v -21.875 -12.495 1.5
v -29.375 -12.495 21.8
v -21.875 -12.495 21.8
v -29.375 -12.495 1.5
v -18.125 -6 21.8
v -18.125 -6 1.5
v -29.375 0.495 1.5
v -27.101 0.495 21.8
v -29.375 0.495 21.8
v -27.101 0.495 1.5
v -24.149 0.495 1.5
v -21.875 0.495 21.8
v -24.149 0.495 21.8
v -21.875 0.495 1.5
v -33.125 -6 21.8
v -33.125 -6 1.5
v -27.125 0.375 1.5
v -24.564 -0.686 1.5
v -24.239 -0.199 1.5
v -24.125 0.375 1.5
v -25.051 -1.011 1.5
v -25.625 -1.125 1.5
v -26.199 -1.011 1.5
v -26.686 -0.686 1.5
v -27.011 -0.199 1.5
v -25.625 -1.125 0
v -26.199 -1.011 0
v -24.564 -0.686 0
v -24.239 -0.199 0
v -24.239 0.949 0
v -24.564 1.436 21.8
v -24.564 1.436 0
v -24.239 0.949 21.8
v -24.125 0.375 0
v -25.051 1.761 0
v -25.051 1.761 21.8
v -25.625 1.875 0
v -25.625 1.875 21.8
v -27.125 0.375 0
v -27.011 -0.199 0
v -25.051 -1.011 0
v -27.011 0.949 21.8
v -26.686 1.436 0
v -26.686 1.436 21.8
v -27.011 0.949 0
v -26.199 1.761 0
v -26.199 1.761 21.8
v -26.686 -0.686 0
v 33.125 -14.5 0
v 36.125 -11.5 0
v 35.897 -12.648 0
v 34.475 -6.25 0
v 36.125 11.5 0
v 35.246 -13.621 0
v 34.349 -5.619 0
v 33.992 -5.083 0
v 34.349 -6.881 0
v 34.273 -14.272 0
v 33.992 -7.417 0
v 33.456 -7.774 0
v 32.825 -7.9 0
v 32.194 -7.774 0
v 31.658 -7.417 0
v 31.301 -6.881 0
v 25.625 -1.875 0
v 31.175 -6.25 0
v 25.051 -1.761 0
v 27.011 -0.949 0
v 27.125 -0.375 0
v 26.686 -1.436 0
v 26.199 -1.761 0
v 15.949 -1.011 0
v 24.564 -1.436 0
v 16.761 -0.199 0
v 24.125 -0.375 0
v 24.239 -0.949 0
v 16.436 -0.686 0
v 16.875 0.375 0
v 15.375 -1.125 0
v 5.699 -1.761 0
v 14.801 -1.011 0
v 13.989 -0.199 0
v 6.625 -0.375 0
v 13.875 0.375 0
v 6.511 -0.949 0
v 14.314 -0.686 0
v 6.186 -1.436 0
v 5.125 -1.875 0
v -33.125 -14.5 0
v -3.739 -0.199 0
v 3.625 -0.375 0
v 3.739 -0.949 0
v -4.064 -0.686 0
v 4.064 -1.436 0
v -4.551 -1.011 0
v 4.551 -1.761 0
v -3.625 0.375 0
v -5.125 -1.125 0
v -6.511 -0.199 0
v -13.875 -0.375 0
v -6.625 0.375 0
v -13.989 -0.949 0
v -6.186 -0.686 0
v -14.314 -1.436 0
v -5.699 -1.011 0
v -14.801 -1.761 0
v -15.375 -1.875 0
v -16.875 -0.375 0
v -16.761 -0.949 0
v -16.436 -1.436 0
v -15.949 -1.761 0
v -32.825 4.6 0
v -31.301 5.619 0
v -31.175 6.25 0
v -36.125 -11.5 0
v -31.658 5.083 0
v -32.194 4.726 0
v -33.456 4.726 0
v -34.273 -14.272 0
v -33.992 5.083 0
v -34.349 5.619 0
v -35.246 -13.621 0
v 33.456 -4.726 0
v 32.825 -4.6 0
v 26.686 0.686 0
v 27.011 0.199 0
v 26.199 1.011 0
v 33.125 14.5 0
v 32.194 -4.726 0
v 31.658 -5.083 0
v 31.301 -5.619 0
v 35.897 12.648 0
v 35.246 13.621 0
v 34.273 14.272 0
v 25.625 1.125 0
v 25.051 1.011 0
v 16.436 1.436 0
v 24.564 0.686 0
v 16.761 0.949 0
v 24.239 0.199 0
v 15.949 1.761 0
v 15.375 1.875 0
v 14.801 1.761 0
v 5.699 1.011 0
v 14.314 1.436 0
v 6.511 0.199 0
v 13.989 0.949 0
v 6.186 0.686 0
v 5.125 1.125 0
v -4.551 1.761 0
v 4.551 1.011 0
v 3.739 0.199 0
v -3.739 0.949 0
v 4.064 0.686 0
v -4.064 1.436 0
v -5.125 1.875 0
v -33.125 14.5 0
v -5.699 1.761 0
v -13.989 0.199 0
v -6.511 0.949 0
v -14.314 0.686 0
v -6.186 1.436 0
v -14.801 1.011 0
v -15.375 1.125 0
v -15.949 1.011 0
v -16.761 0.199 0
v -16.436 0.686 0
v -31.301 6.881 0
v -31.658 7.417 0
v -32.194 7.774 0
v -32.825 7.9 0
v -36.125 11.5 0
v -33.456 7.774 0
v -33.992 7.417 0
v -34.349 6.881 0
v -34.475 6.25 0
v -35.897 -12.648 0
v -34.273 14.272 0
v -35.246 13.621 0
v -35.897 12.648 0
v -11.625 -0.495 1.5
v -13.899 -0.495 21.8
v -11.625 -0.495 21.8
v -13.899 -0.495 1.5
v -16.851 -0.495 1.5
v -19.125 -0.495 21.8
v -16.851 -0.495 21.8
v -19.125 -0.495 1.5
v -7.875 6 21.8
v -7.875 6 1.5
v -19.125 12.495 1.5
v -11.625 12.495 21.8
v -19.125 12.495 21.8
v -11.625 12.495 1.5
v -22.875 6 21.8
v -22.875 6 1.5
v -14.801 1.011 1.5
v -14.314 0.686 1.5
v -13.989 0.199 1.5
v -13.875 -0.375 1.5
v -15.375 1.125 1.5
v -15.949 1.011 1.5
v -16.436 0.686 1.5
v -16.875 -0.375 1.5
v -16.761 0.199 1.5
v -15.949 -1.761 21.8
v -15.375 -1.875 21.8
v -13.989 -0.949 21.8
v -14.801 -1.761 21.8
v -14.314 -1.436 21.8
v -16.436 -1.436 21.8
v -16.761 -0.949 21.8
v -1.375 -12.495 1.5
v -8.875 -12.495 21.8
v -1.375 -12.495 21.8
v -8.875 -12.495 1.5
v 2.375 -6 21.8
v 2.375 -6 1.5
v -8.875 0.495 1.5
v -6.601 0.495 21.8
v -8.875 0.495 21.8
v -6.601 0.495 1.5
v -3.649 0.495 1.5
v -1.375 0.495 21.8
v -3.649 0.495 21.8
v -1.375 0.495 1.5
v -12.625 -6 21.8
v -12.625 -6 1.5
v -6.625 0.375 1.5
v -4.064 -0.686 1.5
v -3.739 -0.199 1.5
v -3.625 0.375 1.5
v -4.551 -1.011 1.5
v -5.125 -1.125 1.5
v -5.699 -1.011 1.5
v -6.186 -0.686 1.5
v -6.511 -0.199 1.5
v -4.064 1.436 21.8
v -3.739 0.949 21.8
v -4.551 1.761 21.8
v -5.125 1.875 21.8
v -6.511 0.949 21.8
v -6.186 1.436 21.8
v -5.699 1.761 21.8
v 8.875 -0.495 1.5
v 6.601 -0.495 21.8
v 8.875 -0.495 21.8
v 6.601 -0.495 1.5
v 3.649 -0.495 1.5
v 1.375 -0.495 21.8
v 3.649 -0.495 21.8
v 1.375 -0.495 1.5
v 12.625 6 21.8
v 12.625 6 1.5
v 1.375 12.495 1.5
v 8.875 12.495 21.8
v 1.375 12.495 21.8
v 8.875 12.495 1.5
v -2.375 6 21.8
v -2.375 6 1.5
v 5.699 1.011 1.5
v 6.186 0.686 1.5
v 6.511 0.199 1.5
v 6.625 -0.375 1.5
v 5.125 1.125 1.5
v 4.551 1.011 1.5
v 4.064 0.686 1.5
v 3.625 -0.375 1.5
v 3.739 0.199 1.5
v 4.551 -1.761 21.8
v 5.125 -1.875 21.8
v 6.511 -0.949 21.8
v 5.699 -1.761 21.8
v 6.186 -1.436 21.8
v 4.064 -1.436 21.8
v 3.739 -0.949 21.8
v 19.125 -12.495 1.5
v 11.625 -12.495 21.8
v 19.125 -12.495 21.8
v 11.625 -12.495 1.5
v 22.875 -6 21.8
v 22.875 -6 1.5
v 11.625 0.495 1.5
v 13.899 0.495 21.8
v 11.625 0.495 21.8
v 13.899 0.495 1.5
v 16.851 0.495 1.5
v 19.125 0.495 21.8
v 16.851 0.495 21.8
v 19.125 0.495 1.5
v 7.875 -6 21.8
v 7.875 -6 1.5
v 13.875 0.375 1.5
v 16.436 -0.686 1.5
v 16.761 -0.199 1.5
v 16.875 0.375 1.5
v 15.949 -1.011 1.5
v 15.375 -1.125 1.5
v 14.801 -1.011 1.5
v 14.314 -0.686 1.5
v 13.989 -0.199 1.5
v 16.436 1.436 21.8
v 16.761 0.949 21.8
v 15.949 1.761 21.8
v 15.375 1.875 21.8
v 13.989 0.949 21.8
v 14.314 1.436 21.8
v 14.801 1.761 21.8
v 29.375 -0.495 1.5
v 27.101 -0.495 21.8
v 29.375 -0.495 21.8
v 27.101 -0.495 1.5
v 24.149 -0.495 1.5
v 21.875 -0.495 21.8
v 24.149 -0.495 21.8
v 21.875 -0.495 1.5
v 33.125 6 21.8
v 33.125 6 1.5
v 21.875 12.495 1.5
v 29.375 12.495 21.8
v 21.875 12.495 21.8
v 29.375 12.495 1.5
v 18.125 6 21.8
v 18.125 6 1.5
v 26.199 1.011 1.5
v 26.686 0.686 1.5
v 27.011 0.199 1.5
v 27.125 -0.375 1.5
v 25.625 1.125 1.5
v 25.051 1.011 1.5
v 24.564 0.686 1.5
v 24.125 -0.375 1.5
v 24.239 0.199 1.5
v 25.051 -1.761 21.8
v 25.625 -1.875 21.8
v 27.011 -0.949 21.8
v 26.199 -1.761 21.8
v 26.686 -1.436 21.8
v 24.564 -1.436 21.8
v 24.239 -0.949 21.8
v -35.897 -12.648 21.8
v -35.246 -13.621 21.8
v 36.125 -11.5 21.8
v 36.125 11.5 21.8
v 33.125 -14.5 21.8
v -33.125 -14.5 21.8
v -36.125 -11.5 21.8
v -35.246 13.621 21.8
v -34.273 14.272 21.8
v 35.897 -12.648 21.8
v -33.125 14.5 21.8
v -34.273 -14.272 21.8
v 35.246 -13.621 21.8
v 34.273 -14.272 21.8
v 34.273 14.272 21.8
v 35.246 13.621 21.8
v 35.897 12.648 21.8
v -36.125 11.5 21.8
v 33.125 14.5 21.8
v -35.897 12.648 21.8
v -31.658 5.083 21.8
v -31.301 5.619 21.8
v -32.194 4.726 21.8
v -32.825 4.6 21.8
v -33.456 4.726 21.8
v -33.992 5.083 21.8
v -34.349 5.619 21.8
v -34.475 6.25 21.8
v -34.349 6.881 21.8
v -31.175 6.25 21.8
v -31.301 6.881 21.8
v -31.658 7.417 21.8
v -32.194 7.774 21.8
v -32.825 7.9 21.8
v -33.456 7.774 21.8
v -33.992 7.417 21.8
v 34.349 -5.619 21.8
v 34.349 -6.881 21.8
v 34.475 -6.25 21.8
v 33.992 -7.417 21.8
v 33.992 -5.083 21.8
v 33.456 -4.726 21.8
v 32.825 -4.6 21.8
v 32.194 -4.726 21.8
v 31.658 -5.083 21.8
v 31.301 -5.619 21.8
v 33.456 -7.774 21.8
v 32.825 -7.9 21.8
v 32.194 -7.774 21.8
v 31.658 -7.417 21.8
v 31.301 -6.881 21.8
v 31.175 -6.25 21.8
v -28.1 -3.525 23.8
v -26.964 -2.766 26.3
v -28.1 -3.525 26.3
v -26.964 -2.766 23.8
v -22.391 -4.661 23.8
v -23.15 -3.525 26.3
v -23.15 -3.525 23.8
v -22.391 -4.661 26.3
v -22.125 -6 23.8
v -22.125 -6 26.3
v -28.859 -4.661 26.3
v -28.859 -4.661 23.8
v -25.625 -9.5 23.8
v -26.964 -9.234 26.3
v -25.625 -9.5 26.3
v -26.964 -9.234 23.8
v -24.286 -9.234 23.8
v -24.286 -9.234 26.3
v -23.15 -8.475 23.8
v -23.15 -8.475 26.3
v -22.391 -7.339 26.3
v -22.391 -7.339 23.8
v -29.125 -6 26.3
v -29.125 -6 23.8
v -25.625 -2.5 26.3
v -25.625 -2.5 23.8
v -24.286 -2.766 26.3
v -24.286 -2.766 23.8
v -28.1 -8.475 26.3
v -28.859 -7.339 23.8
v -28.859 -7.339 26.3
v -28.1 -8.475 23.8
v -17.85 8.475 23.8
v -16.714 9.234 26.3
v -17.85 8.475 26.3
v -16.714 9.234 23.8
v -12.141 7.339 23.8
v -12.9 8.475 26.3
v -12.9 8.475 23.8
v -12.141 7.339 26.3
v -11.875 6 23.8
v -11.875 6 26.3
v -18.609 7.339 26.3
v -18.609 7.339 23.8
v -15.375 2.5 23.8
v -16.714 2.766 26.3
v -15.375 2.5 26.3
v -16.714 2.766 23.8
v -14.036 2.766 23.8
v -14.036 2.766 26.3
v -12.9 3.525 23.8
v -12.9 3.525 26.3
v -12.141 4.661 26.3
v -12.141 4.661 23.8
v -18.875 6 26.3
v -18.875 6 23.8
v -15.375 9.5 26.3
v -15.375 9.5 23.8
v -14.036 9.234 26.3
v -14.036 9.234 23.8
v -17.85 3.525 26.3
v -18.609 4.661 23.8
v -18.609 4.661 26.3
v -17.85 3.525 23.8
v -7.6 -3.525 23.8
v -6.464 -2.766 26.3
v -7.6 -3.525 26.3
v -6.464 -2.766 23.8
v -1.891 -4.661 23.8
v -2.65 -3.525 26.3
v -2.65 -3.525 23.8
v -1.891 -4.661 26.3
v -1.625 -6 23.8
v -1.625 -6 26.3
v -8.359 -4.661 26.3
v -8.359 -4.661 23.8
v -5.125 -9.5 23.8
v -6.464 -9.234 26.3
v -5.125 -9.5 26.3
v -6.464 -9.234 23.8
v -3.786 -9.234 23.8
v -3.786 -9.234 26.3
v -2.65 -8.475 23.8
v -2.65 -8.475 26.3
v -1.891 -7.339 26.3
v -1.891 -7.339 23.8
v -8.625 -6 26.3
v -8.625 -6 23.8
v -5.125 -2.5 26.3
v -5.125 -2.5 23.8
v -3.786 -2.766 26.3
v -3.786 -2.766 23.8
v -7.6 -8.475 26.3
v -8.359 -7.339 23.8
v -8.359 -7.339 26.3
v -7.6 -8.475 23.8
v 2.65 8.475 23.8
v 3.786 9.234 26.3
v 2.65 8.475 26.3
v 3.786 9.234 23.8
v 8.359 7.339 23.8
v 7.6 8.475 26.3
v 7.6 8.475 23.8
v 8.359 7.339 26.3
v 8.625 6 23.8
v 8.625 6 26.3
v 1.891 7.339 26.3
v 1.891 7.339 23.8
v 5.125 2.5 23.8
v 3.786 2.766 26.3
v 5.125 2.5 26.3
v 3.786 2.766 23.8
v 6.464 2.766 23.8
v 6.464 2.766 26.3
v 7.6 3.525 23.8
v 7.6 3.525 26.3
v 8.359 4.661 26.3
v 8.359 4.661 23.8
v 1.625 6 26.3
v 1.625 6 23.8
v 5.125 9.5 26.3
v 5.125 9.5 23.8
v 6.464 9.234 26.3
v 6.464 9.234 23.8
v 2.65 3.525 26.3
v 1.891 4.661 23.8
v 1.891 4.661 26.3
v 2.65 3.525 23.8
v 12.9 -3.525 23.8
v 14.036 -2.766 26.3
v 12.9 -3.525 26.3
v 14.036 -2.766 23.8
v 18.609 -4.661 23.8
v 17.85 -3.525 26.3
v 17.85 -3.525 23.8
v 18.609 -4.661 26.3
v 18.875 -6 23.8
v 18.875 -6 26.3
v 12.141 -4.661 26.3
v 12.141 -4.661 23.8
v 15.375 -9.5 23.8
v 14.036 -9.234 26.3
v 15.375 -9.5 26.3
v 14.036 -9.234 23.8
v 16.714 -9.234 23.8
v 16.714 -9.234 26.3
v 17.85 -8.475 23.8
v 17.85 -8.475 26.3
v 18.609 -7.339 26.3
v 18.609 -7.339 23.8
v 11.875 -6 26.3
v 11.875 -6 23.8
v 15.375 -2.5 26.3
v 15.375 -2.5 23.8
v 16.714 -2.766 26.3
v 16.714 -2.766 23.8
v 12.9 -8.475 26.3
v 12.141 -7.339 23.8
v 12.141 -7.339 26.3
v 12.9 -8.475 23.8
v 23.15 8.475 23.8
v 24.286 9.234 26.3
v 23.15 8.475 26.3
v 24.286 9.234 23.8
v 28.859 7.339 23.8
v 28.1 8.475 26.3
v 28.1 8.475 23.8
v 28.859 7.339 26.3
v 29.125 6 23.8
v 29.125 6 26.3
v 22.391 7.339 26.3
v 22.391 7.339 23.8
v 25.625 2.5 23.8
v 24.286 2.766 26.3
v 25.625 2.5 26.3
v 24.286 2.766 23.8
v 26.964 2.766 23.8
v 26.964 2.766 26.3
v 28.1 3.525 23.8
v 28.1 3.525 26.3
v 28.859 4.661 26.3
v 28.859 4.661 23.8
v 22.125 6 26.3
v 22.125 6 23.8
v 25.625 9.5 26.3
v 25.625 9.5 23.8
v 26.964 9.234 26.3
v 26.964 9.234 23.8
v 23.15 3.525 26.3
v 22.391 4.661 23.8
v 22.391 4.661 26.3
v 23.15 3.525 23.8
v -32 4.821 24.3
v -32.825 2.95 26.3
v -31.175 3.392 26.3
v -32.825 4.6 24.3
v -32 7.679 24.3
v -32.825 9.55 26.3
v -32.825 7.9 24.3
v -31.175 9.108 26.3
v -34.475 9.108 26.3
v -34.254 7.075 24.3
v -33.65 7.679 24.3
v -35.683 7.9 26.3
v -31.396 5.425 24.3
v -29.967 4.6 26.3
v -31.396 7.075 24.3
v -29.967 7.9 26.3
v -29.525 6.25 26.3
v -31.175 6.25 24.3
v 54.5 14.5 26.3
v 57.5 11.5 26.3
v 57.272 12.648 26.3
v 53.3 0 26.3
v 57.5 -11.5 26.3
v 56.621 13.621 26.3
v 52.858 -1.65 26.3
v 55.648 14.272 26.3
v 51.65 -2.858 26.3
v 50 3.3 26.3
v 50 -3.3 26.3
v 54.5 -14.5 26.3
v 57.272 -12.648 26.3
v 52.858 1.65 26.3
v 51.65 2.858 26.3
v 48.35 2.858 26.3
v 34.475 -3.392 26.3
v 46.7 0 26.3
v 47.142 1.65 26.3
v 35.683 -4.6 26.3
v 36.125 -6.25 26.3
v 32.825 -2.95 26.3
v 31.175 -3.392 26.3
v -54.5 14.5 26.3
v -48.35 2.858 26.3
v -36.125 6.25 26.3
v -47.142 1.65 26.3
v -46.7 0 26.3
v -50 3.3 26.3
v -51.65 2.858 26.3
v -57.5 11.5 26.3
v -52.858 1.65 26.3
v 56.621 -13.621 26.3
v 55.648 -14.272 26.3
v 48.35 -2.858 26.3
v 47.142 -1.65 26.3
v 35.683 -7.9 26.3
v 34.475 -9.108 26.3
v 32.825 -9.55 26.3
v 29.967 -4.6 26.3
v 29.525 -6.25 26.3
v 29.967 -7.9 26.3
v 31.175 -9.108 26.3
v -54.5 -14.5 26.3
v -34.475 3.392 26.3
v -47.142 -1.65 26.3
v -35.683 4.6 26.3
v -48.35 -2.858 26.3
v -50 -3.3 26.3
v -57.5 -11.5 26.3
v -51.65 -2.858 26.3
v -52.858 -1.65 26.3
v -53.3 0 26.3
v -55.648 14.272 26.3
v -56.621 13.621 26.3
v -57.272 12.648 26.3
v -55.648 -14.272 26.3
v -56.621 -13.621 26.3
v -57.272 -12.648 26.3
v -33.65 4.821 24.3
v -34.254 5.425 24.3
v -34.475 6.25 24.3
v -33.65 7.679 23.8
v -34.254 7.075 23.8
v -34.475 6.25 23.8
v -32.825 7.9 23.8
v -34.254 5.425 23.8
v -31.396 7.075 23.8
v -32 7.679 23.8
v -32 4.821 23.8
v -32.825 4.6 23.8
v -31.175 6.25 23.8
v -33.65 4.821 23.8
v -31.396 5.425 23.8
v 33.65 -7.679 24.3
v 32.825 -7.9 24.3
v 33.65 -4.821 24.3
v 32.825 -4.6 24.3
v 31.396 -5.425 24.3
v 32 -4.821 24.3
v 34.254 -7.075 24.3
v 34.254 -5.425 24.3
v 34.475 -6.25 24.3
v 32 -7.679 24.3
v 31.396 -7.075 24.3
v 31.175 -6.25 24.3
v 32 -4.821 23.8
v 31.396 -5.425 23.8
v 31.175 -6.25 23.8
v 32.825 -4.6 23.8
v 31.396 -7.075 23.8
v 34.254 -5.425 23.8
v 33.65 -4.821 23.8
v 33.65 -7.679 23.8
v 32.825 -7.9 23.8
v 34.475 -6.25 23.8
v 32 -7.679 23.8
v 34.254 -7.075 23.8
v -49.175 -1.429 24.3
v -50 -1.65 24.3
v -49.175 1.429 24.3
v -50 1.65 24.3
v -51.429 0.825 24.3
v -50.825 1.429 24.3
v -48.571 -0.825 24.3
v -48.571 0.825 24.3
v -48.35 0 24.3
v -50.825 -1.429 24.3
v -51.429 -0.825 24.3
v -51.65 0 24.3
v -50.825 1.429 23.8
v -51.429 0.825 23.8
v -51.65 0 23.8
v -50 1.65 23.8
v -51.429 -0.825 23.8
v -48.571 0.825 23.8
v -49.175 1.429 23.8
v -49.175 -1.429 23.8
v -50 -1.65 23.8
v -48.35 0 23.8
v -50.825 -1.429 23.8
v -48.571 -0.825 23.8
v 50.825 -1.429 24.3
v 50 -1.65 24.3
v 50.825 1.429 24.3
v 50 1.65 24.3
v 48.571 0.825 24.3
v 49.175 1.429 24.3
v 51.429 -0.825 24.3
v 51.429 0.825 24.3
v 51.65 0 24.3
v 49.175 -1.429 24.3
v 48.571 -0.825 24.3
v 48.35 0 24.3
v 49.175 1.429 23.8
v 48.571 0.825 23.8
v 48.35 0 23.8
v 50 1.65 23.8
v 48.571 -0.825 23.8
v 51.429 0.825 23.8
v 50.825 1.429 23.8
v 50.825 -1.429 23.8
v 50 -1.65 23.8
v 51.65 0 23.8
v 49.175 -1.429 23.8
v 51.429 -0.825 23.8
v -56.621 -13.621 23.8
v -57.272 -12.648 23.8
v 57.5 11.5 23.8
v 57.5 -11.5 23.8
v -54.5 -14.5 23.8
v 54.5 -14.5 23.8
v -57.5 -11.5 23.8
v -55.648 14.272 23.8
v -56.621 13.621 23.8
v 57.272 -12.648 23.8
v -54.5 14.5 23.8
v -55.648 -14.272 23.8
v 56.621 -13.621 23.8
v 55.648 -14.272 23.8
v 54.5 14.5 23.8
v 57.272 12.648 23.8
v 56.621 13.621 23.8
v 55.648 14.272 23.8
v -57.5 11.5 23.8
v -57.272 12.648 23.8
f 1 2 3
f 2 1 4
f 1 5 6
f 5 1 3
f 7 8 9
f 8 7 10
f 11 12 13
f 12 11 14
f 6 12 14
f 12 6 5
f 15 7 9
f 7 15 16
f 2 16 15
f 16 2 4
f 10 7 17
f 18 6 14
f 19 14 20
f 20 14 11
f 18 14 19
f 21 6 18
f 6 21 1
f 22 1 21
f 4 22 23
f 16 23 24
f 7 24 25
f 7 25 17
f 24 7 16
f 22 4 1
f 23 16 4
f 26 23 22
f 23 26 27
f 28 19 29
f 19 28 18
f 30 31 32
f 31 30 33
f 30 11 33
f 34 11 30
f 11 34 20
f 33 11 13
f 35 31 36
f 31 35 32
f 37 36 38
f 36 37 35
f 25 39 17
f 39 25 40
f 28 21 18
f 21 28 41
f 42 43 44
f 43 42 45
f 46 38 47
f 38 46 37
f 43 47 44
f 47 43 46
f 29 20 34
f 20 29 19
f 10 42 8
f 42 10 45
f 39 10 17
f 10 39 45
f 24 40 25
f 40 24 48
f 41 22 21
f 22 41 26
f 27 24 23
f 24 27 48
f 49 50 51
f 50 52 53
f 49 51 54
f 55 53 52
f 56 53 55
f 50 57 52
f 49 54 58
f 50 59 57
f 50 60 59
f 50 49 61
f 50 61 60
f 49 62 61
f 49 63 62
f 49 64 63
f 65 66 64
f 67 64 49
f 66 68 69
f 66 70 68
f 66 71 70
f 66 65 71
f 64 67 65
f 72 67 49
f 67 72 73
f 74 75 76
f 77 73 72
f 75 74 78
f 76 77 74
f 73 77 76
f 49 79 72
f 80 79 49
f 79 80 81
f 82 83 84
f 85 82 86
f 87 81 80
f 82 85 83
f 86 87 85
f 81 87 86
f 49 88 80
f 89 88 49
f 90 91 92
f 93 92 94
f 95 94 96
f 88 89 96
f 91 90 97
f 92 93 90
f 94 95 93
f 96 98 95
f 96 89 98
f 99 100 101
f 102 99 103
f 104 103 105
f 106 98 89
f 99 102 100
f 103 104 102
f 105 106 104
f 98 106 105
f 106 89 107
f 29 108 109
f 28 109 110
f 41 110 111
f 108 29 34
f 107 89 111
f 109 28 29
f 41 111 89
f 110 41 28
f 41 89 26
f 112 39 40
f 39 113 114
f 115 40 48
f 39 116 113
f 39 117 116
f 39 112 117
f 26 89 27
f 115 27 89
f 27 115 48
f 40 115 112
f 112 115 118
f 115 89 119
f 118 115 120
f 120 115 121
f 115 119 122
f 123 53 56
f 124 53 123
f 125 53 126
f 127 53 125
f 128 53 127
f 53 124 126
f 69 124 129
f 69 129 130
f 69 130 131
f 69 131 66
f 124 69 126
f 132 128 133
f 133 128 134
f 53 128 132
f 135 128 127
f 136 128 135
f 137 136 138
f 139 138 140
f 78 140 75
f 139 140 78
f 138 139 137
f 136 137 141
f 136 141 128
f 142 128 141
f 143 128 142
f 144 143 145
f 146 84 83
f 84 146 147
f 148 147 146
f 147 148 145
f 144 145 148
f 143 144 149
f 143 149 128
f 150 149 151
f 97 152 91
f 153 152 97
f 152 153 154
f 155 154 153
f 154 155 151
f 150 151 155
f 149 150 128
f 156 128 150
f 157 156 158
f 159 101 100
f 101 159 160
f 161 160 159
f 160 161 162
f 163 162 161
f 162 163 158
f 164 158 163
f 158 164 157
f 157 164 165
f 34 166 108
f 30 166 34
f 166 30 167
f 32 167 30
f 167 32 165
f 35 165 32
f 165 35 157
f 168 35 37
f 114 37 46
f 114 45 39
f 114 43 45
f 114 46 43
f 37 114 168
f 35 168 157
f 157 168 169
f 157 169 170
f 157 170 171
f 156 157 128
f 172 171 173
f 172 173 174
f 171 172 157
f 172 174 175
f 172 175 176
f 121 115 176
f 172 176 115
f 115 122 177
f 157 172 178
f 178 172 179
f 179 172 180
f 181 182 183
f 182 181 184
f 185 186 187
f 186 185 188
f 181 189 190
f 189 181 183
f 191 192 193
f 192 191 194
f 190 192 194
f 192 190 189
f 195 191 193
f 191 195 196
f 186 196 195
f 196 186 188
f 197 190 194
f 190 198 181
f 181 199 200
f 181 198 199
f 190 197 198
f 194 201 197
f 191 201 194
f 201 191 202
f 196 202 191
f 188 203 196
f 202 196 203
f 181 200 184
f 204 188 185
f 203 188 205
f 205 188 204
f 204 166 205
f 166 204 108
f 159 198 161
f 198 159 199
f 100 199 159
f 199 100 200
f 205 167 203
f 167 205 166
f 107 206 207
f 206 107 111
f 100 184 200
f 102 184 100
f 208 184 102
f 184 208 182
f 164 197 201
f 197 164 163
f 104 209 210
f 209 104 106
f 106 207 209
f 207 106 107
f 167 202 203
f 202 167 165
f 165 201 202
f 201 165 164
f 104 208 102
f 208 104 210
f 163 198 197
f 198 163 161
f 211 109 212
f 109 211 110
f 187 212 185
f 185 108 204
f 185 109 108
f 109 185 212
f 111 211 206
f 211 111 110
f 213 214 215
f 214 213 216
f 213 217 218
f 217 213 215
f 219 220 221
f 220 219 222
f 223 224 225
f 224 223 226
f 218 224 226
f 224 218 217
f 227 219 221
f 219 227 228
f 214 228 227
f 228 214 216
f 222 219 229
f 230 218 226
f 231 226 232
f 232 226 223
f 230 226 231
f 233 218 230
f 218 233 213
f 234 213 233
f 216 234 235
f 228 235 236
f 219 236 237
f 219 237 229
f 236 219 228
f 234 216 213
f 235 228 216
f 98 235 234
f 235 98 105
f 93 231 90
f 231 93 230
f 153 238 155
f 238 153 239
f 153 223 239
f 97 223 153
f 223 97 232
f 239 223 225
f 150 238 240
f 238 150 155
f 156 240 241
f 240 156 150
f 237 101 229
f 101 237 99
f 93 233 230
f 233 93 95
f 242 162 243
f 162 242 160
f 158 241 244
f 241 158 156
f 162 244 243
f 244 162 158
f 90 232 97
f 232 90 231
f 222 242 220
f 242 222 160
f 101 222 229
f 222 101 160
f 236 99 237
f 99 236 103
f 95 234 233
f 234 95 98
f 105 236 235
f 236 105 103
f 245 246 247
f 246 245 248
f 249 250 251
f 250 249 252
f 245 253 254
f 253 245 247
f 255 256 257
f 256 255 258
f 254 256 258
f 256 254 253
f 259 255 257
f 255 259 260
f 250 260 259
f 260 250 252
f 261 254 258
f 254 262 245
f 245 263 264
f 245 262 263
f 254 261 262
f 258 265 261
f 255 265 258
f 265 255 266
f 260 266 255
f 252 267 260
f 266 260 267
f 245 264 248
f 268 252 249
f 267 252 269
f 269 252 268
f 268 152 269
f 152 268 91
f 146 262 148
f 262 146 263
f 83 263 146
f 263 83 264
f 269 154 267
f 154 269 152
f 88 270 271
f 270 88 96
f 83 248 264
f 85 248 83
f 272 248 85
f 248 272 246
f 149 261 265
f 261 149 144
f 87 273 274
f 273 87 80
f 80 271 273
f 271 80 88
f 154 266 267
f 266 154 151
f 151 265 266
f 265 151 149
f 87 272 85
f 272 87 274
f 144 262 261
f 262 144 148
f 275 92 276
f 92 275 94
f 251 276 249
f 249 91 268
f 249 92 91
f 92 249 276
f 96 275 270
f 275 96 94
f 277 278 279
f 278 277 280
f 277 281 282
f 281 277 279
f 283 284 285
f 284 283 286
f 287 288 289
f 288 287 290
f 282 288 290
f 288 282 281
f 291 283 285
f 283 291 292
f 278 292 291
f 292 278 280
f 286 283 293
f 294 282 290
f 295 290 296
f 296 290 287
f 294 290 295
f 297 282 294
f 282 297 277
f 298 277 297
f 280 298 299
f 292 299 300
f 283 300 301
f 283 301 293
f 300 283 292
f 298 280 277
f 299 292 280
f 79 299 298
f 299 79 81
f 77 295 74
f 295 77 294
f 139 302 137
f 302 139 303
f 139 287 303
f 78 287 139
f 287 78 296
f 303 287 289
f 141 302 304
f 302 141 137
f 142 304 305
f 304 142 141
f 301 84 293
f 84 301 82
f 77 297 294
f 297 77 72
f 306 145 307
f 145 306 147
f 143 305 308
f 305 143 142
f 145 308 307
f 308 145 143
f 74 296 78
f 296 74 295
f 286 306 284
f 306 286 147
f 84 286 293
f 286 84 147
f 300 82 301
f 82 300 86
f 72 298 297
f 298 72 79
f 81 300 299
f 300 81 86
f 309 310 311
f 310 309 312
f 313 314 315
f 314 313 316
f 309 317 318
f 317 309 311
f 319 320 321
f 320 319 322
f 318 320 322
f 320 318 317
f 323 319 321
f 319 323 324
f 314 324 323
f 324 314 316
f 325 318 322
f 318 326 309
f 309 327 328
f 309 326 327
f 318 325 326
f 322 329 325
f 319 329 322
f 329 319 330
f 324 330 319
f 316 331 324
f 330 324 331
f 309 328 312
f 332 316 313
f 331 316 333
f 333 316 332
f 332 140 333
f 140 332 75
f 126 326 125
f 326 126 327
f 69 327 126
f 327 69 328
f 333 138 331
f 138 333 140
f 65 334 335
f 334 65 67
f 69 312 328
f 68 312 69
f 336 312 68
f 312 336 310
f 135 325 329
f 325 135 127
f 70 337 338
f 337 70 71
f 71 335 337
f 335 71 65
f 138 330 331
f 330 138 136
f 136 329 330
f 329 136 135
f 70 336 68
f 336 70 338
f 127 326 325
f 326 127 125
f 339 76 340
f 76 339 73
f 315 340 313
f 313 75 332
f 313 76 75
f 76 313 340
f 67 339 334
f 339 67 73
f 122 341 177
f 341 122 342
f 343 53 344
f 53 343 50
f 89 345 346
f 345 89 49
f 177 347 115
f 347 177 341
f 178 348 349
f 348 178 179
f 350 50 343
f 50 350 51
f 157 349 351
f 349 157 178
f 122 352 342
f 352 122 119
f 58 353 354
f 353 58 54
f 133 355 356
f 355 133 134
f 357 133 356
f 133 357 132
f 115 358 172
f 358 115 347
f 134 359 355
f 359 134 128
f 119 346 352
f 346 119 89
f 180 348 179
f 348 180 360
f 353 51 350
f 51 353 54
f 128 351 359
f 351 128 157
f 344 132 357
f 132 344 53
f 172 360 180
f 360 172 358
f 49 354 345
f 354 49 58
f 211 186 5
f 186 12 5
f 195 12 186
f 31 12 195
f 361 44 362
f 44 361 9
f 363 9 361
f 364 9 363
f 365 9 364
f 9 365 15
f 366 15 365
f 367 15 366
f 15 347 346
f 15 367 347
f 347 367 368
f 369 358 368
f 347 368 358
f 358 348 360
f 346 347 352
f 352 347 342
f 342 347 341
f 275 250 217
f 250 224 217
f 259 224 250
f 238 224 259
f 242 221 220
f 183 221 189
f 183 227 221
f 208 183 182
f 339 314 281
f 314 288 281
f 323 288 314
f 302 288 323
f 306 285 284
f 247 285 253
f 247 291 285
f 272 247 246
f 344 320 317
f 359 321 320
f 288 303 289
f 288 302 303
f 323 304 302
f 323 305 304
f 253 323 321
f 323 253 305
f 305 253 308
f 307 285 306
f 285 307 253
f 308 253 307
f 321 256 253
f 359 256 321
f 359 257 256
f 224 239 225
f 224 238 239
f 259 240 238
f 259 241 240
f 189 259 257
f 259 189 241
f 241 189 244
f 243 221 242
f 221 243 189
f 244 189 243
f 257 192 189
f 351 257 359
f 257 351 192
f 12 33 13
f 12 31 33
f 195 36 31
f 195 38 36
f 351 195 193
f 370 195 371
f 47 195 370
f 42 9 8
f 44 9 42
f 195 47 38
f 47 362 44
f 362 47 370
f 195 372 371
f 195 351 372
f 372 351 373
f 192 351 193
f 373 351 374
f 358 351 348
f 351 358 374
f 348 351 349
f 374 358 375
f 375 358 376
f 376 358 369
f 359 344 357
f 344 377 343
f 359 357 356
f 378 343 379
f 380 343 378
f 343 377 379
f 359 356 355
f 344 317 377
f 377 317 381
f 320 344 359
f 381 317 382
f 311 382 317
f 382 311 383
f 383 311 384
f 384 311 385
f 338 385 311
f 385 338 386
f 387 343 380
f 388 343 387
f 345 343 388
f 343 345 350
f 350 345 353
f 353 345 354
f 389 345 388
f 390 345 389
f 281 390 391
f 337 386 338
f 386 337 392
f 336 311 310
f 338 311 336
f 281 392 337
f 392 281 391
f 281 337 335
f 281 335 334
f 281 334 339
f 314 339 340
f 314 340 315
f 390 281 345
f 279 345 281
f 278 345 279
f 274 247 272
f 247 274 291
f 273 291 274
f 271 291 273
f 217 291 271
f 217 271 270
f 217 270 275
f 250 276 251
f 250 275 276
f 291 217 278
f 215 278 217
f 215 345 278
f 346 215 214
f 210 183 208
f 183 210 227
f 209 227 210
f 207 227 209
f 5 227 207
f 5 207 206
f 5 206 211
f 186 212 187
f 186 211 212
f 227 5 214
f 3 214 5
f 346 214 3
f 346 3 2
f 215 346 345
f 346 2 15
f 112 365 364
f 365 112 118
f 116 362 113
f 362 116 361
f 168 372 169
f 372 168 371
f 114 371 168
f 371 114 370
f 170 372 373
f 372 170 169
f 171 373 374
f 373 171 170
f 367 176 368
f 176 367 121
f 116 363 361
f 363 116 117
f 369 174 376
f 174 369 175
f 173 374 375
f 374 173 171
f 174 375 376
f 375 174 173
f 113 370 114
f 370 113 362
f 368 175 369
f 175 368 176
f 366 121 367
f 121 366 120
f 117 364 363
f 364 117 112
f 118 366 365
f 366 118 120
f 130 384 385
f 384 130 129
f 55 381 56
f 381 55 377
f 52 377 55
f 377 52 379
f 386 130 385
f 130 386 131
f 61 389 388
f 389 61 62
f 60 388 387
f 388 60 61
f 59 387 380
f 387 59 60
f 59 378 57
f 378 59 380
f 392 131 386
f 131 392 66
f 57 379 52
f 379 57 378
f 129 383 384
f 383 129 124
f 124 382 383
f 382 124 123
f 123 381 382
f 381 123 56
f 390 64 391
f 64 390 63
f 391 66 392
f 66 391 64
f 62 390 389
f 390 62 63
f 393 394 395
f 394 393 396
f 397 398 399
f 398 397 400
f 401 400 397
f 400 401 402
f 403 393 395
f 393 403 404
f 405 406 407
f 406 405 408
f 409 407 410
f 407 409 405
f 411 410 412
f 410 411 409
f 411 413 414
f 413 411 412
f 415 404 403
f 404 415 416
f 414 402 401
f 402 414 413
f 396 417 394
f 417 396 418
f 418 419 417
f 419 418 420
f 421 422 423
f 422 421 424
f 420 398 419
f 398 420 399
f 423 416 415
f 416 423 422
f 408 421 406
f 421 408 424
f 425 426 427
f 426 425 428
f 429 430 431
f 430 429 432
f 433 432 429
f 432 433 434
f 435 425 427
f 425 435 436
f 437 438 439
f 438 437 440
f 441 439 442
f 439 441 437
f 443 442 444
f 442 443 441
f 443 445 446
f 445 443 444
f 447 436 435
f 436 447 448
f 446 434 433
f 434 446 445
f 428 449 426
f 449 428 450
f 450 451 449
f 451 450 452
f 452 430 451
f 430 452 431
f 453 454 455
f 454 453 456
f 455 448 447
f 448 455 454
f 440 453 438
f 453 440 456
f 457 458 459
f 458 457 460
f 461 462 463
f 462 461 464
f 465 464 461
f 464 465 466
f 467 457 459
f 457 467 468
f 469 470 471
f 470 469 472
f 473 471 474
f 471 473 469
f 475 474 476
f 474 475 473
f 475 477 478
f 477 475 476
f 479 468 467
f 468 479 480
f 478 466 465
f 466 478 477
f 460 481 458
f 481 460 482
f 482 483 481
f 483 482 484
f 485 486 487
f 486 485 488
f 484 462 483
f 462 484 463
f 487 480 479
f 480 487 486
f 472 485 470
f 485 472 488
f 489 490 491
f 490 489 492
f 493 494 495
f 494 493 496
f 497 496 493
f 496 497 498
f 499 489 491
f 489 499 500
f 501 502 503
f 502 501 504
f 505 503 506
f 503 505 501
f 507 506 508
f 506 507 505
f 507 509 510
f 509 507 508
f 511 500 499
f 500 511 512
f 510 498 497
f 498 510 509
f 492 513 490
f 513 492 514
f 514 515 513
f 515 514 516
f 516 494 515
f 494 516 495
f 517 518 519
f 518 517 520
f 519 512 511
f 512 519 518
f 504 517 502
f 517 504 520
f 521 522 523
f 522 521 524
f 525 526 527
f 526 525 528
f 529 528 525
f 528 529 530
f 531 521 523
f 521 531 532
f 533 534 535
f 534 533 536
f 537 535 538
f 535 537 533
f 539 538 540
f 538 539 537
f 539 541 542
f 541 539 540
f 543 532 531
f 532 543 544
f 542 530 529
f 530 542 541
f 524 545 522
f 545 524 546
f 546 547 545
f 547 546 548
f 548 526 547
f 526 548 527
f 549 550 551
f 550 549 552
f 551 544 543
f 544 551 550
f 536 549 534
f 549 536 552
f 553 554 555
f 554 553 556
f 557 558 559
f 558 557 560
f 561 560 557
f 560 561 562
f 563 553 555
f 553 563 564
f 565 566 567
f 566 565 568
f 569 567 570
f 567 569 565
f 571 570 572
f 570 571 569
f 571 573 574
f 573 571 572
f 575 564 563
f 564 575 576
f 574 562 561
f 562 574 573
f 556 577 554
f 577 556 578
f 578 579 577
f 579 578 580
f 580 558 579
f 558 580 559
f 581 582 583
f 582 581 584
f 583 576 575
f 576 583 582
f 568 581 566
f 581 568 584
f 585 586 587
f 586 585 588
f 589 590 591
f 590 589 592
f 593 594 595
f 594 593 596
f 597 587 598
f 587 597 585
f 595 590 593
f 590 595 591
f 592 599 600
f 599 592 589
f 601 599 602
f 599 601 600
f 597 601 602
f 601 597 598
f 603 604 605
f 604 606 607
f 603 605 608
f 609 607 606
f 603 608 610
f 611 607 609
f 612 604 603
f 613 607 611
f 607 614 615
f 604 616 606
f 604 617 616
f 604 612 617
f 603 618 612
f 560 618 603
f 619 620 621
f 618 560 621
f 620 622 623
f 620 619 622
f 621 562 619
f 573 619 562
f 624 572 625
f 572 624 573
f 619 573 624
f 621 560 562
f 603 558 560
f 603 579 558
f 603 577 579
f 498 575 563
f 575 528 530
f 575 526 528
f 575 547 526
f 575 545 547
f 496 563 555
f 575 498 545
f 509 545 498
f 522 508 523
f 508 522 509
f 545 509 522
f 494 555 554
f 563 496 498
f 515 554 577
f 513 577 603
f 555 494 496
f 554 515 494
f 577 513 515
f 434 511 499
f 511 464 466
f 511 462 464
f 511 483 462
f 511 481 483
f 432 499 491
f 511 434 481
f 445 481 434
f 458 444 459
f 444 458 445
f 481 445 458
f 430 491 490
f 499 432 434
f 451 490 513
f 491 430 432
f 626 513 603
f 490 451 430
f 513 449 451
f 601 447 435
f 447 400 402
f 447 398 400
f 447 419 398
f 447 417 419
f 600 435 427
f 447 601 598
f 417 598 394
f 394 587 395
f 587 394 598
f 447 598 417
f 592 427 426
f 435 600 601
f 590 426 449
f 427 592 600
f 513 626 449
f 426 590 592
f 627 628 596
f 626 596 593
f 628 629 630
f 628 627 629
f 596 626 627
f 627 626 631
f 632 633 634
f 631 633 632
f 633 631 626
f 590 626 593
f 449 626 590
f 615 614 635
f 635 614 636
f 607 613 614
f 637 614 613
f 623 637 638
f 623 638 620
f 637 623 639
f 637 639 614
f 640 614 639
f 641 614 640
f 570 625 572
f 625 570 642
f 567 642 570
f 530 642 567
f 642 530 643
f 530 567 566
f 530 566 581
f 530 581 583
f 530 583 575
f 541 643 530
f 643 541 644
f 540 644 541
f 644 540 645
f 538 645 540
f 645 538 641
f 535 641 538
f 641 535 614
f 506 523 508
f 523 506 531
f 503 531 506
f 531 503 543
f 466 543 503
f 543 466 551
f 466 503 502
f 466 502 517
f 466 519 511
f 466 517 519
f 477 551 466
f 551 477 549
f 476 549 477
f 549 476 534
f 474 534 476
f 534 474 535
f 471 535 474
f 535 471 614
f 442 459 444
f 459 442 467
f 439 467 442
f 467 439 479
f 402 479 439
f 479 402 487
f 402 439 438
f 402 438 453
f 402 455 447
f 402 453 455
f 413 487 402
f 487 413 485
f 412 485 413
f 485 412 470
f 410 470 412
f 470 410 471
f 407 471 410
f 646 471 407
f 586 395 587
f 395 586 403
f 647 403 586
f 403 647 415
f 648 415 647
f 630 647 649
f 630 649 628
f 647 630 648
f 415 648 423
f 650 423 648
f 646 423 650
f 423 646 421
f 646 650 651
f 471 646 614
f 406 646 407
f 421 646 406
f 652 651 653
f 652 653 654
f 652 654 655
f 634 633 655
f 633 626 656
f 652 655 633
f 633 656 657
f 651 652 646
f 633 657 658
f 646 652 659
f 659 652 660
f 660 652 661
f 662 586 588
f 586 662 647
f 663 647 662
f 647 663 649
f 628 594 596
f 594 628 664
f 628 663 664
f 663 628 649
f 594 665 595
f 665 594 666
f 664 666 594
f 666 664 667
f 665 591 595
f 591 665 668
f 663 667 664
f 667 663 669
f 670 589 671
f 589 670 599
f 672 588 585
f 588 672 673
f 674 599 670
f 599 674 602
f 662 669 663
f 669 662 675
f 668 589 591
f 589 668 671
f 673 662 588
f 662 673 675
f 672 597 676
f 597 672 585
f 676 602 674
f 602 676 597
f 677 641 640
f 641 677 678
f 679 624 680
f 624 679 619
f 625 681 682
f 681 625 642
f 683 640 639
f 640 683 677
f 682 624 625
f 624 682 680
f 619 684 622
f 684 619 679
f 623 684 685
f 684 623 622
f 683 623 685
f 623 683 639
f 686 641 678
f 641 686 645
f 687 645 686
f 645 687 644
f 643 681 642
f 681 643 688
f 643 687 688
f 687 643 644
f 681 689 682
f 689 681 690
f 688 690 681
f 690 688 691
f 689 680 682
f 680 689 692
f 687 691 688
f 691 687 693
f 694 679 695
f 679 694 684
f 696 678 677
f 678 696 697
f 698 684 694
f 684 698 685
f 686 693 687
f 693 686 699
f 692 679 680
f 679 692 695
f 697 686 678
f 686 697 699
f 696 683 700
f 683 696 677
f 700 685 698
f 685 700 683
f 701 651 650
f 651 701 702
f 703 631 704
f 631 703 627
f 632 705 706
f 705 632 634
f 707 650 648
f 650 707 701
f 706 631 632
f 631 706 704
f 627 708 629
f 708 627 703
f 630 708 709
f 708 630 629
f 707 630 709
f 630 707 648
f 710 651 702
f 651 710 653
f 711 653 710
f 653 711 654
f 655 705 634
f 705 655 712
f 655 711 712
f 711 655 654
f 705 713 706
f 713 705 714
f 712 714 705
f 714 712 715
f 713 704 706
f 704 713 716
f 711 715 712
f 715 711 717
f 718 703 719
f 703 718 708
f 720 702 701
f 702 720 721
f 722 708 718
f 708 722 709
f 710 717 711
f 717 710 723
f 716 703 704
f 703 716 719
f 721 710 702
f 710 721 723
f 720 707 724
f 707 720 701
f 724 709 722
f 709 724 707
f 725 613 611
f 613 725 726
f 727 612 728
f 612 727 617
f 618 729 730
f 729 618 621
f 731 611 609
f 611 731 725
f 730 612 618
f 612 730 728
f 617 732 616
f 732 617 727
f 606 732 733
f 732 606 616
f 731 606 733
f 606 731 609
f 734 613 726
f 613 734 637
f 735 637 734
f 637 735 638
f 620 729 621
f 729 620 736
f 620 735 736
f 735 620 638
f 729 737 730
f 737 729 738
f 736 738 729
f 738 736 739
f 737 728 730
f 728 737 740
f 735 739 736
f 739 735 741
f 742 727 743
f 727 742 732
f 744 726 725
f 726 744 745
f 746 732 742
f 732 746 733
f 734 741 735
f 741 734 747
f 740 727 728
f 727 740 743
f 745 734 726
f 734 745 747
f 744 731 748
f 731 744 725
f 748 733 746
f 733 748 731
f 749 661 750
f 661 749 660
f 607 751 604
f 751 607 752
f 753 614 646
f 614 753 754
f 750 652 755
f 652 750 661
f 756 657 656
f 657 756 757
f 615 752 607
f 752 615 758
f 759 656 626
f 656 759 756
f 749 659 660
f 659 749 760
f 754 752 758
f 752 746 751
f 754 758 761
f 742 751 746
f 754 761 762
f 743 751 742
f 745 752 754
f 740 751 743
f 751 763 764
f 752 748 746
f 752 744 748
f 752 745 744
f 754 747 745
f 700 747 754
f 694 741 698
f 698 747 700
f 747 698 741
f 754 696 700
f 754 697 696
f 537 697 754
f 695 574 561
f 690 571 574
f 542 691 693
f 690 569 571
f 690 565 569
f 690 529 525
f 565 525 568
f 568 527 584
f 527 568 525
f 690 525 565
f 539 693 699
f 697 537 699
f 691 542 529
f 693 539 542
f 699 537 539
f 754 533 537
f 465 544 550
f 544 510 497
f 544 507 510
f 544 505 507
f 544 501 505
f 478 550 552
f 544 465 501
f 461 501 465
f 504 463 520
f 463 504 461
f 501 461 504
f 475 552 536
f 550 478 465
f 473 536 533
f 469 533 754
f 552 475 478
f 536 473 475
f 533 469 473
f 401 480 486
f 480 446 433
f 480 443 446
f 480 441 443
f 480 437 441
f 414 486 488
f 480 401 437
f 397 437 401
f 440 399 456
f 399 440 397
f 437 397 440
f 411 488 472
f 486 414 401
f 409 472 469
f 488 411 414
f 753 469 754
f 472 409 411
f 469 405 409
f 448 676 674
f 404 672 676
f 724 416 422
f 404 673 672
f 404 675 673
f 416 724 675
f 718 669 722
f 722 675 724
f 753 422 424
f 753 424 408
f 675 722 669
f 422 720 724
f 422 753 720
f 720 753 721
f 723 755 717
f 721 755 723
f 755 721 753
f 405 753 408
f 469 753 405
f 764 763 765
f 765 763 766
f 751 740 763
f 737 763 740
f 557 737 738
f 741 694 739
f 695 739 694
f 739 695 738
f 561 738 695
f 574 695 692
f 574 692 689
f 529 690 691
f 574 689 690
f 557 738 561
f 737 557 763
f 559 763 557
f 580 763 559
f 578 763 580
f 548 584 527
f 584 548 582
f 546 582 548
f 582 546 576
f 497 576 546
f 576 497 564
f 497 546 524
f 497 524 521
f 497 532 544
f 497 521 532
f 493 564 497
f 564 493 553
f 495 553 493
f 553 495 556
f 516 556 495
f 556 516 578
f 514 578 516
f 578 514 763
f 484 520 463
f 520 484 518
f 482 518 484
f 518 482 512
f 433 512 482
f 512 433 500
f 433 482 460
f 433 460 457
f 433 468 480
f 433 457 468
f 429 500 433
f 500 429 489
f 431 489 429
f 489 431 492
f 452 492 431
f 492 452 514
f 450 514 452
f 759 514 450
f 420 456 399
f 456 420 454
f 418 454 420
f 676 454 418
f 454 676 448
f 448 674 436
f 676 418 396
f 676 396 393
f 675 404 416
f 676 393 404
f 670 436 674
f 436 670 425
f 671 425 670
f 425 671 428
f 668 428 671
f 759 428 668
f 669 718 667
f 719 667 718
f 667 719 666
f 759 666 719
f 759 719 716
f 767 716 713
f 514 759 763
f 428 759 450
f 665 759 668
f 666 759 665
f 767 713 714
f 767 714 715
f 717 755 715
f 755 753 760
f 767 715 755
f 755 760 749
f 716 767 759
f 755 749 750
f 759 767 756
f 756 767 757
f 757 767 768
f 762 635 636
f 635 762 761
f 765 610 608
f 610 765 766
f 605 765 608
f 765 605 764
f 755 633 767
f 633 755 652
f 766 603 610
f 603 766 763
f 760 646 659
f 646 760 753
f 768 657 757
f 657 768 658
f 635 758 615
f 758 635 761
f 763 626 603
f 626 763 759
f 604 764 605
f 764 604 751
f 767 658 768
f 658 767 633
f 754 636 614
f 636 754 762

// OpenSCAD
// file: screws.scad
module screwA(dia,z,hDia,hZ,rY){
    rotate([0,rY,0]){
    $fn=12;
    cylinder(d1=hDia,d2=dia,h=hZ);
    cylinder(d=dia,h=z);
    }
}
// file: parameter.scad
nStrings=6;
nFrets=24;
nLedFrets=16;
m5Dia=5.3;
m5HeadZ=3.5;
m4Dia=4.3;
m4NutDia=8.3;
m4NutZ=3.5;
m4HeadZ=2.5;
m3Dia=3.3;
m3NutDia=6.6;
m3NutZ=2.5;
m3HeadZ=2;
strDistN=7;
strDistB=10.25;
scale=645;
neckSlotY=500;

slotXY=15;

bodySlotX=115;
bodySlotY=250;

jackYA=40;
jackYB=54;
jackZA=20;
jackZB=25;

bodyX=300;

bodyZ=40;

strDia=[1.7,1.4,1.1,0.7,0.5,0.35];

fretStrPlus=4;
fretLN=strDistN*(nStrings-1)+fretStrPlus*2;
fretLB=strDistB*(nStrings-1)+fretStrPlus*2;
strSpanB=strDistB*(nStrings-1);
strSpanN=strDistN*(nStrings-1);
fretBtmZ=1;
neckSlotX=fretLN;
neckSlotDist=neckSlotX-slotXY*2;

neck_sideT=5.5; //thicknes of the neck side locks
neck_bottomT=2.5;

neck_mntPosYA=447;
neck_mntPosYB=420;
neck_mntEndT=2.5;
neck_lastFretSpc=13;

nut_slotSink=6;

//fretY=16;
fretPcbZ=1.6;
fretDia=3.5;
fretZ=1.5;
fretOvrZ=4;
fretboardZ=fretOvrZ+fretPcbZ;



L=scale;
k=1.05946;

fretPos1=scale-(scale/pow(k,4));

function fretPos(i)=L-(L/pow(k,i));
function fretSpc(i)=(L/pow(k,i))-(L/pow(k,i+1));
function strSpc(i)=i/L*strDistB+(1-i/L)*strDistN;
function fretL(i)=(i/L*strDistB+(1-i/L)*strDistN)*(nStrings-1)+fretStrPlus*2;

echo (70-(fretL(fretPos(1))));
// main file
include <parameter.scad>
include <screws.scad>
//kickup();
mcMag();

strings=6;
spacing=strSpanB;//52;
echo (spacing);
diameter=15;
wall=2;
coilZ=15;
bottomZ=1.5;
t=0.3;
ySpacing=12;

bX = spacing+diameter+wall*3;
bY=ySpacing+diameter+wall*1;
bZ=coilZ+bottomZ+t;

tX = bX;
tY=bY;
hub=2.5;
magZ=1.5;
tbottomZ=2;
tZ=hub+magZ+tbottomZ;
tDia=7;//6.5;
screwTdia=3.3;


screwAdia=3;
topZ=2.5;


module base(bZ,screwMdia){
$fn=16;
difference(){
translate([0,0,0])rcube([bX,bY,bZ],3);

translate([-spacing/2,0,0]){
for(x=[0:strings-1]){
translate([x*(spacing/(strings-1)),(x%2-0.5)*ySpacing,0]){
translate([0,0,bottomZ])cylinder(d=diameter,h=100,$fn=6);
translate([0,(x%2-0.5)*-(diameter/100*95-screwAdia/2),0])cylinder(d=screwAdia,h=100);
}}

}
translate([-bX/2+screwMdia*1,bY/2-screwMdia*2.5,0])cylinder(d=screwMdia,h=bZ);
translate([bX/2-screwMdia*1,-bY/2+screwMdia*2.5,0])cylinder(d=screwMdia,h=bZ);
}
}

module top(){
$fn=16;
difference(){
translate([0,0,0])rcube([tX,tY,tZ],3);

translate([-spacing/2,0,0]){
for(x=[0:strings-1]){
translate([x*(spacing/(strings-1)),(x%2-0.5)*ySpacing,0]){
translate([0,0,-tbottomZ])cylinder(d=tDia,h=tZ);
cylinder(d=screwTdia,h=tZ);
}}

}
translate([-bX/2+screwMdia*1,bY/2-screwMdia*2.5,0])cylinder(d=screwMdia,h=tZ);
translate([bX/2-screwMdia*1,-bY/2+screwMdia*2.5,0])cylinder(d=screwMdia,h=tZ);
}
}
module topMacMag(screwMdia){
$fn=16;
difference(){
translate([0,0,0])rcube([bodySlotX,tY,2.5],3);

translate([-spacing/2,0,0]){
for(x=[0:strings-1]){
translate([x*(spacing/(strings-1)),(x%2-0.5)*ySpacing,0]){
translate([0,0,-tbottomZ])cylinder(d=tDia,h=tZ);
cylinder(d=screwTdia,h=tZ);
}}

}
translate([-bX/2+screwMdia*1,bY/2-screwMdia*2.5,topZ])screwA(m3Dia,10,m3Dia*2,2,180);
translate([bX/2-screwMdia*1,-bY/2+screwMdia*2.5,topZ])screwA(m3Dia,10,m3Dia*2,2,180);


translate([-bodySlotX/2+slotXY/2,0,topZ])screwA(m3Dia,10,m3Dia*2,2,180);
translate([-(-bodySlotX/2+slotXY/2),0,topZ])screwA(m3Dia,10,m3Dia*2,2,180);
}
}

module topKickUp(){
$fn=16;
difference(){
translate([0,0,0])rcube([bodySlotX,tY,2.5],3);

translate([-spacing/2,0,0]){
for(x=[0:strings-1]){
translate([x*(spacing/(strings-1)),(x%2-0.5)*ySpacing,0]){
cylinder(d=screwTdia+t,h=tZ);
}}

}
//translate([-bX/2+screwMdia*1,bY/2-screwMdia*2.5,0])cylinder(d=screwMdia-t,h=tZ);
//translate([bX/2-screwMdia*1,-bY/2+screwMdia*2.5,0])cylinder(d=screwMdia-t,h=tZ);
translate([-bX/2+screwMdia*1,bY/2-screwMdia*2.5,0])cylinder(d=screwMdia,h=bZ);
translate([bX/2-screwMdia*1,-bY/2+screwMdia*2.5,0])cylinder(d=screwMdia,h=bZ);

translate([-bodySlotX/2+slotXY/2,0,topZ])screwA(m3Dia,10,m3Dia*2,2,180);
translate([bodySlotX/2-slotXY/2,0,topZ])screwA(m3Dia,10,m3Dia*2,2,180);
}
}
module toplift(){
$fn=16;
lift=1.5;
difference(){
translate([0,0,0])rcube([slotXY,tY,lift],3);

hull(){
translate([0,0,0])cylinder(d=screwMdia+t,h=tZ);
translate([0,-tY,0])cylinder(d=screwMdia+t,h=tZ);
}
}
}

module blende(){
$fn=16;
x=95;
y=50;
z=1.5;
m=20;
scrwD=2.5;
sdX=85;
sdY=38;
ovlp=3;
offX=0;
offY=-4;
spcX=2.5;
spcY=4;
difference(){
union(){
difference(){
translate([offX,offY,0])rcube([x,y,z],2);
rcube([tX-ovlp*2,tY-ovlp*2,tZ],2);#
translate([offX,offY,0]){
hull(){
translate([sdX/2,sdY/2+spcY/2,0])cylinder(d=scrwD,h=z);
translate([sdX/2,sdY/2-spcY/2,0])cylinder(d=scrwD,h=z);}
hull(){
translate([-sdX/2,sdY/2+spcY/2,0])cylinder(d=scrwD,h=z);
translate([-sdX/2,sdY/2-spcY/2,0])cylinder(d=scrwD,h=z);}
hull(){
translate([-sdX/2,-sdY/2+spcY/2,0])cylinder(d=scrwD,h=z);
translate([-sdX/2,-sdY/2-spcY/2,0])cylinder(d=scrwD,h=z);}
hull(){
translate([sdX/2,-sdY/2+spcY/2,0])cylinder(d=scrwD,h=z);
translate([sdX/2,-sdY/2-spcY/2,0])cylinder(d=scrwD,h=z);}
}}
scale([-1,1,1]){
translate([-tX/2,-tY/2,0]){
difference(){
cube([m,m,z]);
translate([m,0,0])rotate([0,0,45])cube([100,100,z+1]);
}}
}

scale([1,-1,1]){
translate([-tX/2,-tY/2,0]){
difference(){
cube([m,m,z]);
translate([m,0,0])rotate([0,0,45])cube([100,100,z+1]);
translate([screwMdia*1.5,screwMdia*1.5,0])cylinder(d=screwMdia,h=tZ);
}}
}
}
hull(){
translate([-bX/2+screwMdia*1.5-spcX/2,bY/2-screwMdia*1.5,0])cylinder(d=screwMdia,h=tZ);
translate([-bX/2+screwMdia*1.5+spcX/2,bY/2-screwMdia*1.5,0])cylinder(d=screwMdia,h=tZ);}
hull(){
translate([bX/2-screwMdia*1.5-spcX/2,-bY/2+screwMdia*1.5,0])cylinder(d=screwMdia,h=tZ);
translate([bX/2-screwMdia*1.5+spcX/2,-bY/2+screwMdia*1.5,0])cylinder(d=screwMdia,h=tZ);}}

}

module rcube(size,radius){
linear_extrude(height=size[2])
if(radius>0){
hull()
{
    // place 4 circles in the corners, with the given radius
    translate([(-size[0]/2)+(radius), (-size[1]/2)+(radius), 0])
    circle(r=radius);

    translate([(size[0]/2)-(radius), (-size[1]/2)+(radius), 0])
    circle(r=radius);

    translate([(-size[0]/2)+(radius), (size[1]/2)-(radius), 0])
    circle(r=radius);

    translate([(size[0]/2)-(radius), (size[1]/2)-(radius), 0])
    circle(r=radius);
}
}
if(radius==0){
translate([0,0,size[2]/2])cube(size,center=true);
}
}




module coil(){
$fn=32;
magholedia=4;
wallthick=0.5;
loweridlerZ=1.8;
upperidlerZ=1.8;
rampBZ=0.2;
rampTZ=0.2;
coildia=14;
rampdia=coildia;
threaddepth=5;
roofZ=loweridlerZ;

difference(){
union(){
cylinder(d=magholedia+wallthick*2,h=coilZ);
translate([0,0,loweridlerZ])cylinder(d1=rampdia,d2=magholedia+wallthick*2,h=rampBZ,$fn=6);
translate([0,0,coilZ-upperidlerZ-rampTZ])cylinder(d2=rampdia/100*100,d1=magholedia+wallthick*2,h=rampTZ,$fn=6);
translate([0,0,coilZ-upperidlerZ])cylinder(d=coildia/100*100,h=upperidlerZ,,$fn=6);
//Ccube([coildia,coildia,upperidlerZ],[0,0,1]);
translate([0,0,0]){
//Ccube([coildia,coildia,loweridlerZ],[0,0,1]);
cylinder(d=coildia,h=loweridlerZ,$fn=6);

}
}

translate([0,0,-roofZ])cylinder(d=magholedia,h=coilZ);
//cylinder(d=coilthreaddia,h=coilZ+1);
}}

module kickup(){
base();
translate([0,0,bZ+tZ])rotate([0,0,0])top();
translate([0,-33,bZ])rotate([0,0,0])topKickUp();
//translate([0,0,bZ])rotate([0,0,0])toplift();
//translate([0,0,bZ+tZ+19])rotate([0,0,0])blende();
//translate([0,tY+28,tZ])rotate([180,0,0])top();
//translate([0,tY+0,0])rotate([0,90,0])coil();
}

module mcMag(){
coilZ=20;
bZ=coilZ+bottomZ+t;
screwMdia=3.3;   
base(bZ,screwMdia);
//translate([0,0,bZ+tZ])rotate([0,0,0])top();
translate([0,0,bZ+2])rotate([0,0,0])topMacMag(screwMdia);
//translate([0,-33,bZ])rotate([0,0,0])topKickUp();
//topKickUp();
//translate([0,0,bZ])rotate([0,0,0])toplift();
//translate([0,0,bZ+tZ+19])rotate([0,0,0])blende();
//translate([0,tY+28,tZ])rotate([180,0,0])top();
//translate([0,tY+0,0])rotate([0,90,0])coil();
}
